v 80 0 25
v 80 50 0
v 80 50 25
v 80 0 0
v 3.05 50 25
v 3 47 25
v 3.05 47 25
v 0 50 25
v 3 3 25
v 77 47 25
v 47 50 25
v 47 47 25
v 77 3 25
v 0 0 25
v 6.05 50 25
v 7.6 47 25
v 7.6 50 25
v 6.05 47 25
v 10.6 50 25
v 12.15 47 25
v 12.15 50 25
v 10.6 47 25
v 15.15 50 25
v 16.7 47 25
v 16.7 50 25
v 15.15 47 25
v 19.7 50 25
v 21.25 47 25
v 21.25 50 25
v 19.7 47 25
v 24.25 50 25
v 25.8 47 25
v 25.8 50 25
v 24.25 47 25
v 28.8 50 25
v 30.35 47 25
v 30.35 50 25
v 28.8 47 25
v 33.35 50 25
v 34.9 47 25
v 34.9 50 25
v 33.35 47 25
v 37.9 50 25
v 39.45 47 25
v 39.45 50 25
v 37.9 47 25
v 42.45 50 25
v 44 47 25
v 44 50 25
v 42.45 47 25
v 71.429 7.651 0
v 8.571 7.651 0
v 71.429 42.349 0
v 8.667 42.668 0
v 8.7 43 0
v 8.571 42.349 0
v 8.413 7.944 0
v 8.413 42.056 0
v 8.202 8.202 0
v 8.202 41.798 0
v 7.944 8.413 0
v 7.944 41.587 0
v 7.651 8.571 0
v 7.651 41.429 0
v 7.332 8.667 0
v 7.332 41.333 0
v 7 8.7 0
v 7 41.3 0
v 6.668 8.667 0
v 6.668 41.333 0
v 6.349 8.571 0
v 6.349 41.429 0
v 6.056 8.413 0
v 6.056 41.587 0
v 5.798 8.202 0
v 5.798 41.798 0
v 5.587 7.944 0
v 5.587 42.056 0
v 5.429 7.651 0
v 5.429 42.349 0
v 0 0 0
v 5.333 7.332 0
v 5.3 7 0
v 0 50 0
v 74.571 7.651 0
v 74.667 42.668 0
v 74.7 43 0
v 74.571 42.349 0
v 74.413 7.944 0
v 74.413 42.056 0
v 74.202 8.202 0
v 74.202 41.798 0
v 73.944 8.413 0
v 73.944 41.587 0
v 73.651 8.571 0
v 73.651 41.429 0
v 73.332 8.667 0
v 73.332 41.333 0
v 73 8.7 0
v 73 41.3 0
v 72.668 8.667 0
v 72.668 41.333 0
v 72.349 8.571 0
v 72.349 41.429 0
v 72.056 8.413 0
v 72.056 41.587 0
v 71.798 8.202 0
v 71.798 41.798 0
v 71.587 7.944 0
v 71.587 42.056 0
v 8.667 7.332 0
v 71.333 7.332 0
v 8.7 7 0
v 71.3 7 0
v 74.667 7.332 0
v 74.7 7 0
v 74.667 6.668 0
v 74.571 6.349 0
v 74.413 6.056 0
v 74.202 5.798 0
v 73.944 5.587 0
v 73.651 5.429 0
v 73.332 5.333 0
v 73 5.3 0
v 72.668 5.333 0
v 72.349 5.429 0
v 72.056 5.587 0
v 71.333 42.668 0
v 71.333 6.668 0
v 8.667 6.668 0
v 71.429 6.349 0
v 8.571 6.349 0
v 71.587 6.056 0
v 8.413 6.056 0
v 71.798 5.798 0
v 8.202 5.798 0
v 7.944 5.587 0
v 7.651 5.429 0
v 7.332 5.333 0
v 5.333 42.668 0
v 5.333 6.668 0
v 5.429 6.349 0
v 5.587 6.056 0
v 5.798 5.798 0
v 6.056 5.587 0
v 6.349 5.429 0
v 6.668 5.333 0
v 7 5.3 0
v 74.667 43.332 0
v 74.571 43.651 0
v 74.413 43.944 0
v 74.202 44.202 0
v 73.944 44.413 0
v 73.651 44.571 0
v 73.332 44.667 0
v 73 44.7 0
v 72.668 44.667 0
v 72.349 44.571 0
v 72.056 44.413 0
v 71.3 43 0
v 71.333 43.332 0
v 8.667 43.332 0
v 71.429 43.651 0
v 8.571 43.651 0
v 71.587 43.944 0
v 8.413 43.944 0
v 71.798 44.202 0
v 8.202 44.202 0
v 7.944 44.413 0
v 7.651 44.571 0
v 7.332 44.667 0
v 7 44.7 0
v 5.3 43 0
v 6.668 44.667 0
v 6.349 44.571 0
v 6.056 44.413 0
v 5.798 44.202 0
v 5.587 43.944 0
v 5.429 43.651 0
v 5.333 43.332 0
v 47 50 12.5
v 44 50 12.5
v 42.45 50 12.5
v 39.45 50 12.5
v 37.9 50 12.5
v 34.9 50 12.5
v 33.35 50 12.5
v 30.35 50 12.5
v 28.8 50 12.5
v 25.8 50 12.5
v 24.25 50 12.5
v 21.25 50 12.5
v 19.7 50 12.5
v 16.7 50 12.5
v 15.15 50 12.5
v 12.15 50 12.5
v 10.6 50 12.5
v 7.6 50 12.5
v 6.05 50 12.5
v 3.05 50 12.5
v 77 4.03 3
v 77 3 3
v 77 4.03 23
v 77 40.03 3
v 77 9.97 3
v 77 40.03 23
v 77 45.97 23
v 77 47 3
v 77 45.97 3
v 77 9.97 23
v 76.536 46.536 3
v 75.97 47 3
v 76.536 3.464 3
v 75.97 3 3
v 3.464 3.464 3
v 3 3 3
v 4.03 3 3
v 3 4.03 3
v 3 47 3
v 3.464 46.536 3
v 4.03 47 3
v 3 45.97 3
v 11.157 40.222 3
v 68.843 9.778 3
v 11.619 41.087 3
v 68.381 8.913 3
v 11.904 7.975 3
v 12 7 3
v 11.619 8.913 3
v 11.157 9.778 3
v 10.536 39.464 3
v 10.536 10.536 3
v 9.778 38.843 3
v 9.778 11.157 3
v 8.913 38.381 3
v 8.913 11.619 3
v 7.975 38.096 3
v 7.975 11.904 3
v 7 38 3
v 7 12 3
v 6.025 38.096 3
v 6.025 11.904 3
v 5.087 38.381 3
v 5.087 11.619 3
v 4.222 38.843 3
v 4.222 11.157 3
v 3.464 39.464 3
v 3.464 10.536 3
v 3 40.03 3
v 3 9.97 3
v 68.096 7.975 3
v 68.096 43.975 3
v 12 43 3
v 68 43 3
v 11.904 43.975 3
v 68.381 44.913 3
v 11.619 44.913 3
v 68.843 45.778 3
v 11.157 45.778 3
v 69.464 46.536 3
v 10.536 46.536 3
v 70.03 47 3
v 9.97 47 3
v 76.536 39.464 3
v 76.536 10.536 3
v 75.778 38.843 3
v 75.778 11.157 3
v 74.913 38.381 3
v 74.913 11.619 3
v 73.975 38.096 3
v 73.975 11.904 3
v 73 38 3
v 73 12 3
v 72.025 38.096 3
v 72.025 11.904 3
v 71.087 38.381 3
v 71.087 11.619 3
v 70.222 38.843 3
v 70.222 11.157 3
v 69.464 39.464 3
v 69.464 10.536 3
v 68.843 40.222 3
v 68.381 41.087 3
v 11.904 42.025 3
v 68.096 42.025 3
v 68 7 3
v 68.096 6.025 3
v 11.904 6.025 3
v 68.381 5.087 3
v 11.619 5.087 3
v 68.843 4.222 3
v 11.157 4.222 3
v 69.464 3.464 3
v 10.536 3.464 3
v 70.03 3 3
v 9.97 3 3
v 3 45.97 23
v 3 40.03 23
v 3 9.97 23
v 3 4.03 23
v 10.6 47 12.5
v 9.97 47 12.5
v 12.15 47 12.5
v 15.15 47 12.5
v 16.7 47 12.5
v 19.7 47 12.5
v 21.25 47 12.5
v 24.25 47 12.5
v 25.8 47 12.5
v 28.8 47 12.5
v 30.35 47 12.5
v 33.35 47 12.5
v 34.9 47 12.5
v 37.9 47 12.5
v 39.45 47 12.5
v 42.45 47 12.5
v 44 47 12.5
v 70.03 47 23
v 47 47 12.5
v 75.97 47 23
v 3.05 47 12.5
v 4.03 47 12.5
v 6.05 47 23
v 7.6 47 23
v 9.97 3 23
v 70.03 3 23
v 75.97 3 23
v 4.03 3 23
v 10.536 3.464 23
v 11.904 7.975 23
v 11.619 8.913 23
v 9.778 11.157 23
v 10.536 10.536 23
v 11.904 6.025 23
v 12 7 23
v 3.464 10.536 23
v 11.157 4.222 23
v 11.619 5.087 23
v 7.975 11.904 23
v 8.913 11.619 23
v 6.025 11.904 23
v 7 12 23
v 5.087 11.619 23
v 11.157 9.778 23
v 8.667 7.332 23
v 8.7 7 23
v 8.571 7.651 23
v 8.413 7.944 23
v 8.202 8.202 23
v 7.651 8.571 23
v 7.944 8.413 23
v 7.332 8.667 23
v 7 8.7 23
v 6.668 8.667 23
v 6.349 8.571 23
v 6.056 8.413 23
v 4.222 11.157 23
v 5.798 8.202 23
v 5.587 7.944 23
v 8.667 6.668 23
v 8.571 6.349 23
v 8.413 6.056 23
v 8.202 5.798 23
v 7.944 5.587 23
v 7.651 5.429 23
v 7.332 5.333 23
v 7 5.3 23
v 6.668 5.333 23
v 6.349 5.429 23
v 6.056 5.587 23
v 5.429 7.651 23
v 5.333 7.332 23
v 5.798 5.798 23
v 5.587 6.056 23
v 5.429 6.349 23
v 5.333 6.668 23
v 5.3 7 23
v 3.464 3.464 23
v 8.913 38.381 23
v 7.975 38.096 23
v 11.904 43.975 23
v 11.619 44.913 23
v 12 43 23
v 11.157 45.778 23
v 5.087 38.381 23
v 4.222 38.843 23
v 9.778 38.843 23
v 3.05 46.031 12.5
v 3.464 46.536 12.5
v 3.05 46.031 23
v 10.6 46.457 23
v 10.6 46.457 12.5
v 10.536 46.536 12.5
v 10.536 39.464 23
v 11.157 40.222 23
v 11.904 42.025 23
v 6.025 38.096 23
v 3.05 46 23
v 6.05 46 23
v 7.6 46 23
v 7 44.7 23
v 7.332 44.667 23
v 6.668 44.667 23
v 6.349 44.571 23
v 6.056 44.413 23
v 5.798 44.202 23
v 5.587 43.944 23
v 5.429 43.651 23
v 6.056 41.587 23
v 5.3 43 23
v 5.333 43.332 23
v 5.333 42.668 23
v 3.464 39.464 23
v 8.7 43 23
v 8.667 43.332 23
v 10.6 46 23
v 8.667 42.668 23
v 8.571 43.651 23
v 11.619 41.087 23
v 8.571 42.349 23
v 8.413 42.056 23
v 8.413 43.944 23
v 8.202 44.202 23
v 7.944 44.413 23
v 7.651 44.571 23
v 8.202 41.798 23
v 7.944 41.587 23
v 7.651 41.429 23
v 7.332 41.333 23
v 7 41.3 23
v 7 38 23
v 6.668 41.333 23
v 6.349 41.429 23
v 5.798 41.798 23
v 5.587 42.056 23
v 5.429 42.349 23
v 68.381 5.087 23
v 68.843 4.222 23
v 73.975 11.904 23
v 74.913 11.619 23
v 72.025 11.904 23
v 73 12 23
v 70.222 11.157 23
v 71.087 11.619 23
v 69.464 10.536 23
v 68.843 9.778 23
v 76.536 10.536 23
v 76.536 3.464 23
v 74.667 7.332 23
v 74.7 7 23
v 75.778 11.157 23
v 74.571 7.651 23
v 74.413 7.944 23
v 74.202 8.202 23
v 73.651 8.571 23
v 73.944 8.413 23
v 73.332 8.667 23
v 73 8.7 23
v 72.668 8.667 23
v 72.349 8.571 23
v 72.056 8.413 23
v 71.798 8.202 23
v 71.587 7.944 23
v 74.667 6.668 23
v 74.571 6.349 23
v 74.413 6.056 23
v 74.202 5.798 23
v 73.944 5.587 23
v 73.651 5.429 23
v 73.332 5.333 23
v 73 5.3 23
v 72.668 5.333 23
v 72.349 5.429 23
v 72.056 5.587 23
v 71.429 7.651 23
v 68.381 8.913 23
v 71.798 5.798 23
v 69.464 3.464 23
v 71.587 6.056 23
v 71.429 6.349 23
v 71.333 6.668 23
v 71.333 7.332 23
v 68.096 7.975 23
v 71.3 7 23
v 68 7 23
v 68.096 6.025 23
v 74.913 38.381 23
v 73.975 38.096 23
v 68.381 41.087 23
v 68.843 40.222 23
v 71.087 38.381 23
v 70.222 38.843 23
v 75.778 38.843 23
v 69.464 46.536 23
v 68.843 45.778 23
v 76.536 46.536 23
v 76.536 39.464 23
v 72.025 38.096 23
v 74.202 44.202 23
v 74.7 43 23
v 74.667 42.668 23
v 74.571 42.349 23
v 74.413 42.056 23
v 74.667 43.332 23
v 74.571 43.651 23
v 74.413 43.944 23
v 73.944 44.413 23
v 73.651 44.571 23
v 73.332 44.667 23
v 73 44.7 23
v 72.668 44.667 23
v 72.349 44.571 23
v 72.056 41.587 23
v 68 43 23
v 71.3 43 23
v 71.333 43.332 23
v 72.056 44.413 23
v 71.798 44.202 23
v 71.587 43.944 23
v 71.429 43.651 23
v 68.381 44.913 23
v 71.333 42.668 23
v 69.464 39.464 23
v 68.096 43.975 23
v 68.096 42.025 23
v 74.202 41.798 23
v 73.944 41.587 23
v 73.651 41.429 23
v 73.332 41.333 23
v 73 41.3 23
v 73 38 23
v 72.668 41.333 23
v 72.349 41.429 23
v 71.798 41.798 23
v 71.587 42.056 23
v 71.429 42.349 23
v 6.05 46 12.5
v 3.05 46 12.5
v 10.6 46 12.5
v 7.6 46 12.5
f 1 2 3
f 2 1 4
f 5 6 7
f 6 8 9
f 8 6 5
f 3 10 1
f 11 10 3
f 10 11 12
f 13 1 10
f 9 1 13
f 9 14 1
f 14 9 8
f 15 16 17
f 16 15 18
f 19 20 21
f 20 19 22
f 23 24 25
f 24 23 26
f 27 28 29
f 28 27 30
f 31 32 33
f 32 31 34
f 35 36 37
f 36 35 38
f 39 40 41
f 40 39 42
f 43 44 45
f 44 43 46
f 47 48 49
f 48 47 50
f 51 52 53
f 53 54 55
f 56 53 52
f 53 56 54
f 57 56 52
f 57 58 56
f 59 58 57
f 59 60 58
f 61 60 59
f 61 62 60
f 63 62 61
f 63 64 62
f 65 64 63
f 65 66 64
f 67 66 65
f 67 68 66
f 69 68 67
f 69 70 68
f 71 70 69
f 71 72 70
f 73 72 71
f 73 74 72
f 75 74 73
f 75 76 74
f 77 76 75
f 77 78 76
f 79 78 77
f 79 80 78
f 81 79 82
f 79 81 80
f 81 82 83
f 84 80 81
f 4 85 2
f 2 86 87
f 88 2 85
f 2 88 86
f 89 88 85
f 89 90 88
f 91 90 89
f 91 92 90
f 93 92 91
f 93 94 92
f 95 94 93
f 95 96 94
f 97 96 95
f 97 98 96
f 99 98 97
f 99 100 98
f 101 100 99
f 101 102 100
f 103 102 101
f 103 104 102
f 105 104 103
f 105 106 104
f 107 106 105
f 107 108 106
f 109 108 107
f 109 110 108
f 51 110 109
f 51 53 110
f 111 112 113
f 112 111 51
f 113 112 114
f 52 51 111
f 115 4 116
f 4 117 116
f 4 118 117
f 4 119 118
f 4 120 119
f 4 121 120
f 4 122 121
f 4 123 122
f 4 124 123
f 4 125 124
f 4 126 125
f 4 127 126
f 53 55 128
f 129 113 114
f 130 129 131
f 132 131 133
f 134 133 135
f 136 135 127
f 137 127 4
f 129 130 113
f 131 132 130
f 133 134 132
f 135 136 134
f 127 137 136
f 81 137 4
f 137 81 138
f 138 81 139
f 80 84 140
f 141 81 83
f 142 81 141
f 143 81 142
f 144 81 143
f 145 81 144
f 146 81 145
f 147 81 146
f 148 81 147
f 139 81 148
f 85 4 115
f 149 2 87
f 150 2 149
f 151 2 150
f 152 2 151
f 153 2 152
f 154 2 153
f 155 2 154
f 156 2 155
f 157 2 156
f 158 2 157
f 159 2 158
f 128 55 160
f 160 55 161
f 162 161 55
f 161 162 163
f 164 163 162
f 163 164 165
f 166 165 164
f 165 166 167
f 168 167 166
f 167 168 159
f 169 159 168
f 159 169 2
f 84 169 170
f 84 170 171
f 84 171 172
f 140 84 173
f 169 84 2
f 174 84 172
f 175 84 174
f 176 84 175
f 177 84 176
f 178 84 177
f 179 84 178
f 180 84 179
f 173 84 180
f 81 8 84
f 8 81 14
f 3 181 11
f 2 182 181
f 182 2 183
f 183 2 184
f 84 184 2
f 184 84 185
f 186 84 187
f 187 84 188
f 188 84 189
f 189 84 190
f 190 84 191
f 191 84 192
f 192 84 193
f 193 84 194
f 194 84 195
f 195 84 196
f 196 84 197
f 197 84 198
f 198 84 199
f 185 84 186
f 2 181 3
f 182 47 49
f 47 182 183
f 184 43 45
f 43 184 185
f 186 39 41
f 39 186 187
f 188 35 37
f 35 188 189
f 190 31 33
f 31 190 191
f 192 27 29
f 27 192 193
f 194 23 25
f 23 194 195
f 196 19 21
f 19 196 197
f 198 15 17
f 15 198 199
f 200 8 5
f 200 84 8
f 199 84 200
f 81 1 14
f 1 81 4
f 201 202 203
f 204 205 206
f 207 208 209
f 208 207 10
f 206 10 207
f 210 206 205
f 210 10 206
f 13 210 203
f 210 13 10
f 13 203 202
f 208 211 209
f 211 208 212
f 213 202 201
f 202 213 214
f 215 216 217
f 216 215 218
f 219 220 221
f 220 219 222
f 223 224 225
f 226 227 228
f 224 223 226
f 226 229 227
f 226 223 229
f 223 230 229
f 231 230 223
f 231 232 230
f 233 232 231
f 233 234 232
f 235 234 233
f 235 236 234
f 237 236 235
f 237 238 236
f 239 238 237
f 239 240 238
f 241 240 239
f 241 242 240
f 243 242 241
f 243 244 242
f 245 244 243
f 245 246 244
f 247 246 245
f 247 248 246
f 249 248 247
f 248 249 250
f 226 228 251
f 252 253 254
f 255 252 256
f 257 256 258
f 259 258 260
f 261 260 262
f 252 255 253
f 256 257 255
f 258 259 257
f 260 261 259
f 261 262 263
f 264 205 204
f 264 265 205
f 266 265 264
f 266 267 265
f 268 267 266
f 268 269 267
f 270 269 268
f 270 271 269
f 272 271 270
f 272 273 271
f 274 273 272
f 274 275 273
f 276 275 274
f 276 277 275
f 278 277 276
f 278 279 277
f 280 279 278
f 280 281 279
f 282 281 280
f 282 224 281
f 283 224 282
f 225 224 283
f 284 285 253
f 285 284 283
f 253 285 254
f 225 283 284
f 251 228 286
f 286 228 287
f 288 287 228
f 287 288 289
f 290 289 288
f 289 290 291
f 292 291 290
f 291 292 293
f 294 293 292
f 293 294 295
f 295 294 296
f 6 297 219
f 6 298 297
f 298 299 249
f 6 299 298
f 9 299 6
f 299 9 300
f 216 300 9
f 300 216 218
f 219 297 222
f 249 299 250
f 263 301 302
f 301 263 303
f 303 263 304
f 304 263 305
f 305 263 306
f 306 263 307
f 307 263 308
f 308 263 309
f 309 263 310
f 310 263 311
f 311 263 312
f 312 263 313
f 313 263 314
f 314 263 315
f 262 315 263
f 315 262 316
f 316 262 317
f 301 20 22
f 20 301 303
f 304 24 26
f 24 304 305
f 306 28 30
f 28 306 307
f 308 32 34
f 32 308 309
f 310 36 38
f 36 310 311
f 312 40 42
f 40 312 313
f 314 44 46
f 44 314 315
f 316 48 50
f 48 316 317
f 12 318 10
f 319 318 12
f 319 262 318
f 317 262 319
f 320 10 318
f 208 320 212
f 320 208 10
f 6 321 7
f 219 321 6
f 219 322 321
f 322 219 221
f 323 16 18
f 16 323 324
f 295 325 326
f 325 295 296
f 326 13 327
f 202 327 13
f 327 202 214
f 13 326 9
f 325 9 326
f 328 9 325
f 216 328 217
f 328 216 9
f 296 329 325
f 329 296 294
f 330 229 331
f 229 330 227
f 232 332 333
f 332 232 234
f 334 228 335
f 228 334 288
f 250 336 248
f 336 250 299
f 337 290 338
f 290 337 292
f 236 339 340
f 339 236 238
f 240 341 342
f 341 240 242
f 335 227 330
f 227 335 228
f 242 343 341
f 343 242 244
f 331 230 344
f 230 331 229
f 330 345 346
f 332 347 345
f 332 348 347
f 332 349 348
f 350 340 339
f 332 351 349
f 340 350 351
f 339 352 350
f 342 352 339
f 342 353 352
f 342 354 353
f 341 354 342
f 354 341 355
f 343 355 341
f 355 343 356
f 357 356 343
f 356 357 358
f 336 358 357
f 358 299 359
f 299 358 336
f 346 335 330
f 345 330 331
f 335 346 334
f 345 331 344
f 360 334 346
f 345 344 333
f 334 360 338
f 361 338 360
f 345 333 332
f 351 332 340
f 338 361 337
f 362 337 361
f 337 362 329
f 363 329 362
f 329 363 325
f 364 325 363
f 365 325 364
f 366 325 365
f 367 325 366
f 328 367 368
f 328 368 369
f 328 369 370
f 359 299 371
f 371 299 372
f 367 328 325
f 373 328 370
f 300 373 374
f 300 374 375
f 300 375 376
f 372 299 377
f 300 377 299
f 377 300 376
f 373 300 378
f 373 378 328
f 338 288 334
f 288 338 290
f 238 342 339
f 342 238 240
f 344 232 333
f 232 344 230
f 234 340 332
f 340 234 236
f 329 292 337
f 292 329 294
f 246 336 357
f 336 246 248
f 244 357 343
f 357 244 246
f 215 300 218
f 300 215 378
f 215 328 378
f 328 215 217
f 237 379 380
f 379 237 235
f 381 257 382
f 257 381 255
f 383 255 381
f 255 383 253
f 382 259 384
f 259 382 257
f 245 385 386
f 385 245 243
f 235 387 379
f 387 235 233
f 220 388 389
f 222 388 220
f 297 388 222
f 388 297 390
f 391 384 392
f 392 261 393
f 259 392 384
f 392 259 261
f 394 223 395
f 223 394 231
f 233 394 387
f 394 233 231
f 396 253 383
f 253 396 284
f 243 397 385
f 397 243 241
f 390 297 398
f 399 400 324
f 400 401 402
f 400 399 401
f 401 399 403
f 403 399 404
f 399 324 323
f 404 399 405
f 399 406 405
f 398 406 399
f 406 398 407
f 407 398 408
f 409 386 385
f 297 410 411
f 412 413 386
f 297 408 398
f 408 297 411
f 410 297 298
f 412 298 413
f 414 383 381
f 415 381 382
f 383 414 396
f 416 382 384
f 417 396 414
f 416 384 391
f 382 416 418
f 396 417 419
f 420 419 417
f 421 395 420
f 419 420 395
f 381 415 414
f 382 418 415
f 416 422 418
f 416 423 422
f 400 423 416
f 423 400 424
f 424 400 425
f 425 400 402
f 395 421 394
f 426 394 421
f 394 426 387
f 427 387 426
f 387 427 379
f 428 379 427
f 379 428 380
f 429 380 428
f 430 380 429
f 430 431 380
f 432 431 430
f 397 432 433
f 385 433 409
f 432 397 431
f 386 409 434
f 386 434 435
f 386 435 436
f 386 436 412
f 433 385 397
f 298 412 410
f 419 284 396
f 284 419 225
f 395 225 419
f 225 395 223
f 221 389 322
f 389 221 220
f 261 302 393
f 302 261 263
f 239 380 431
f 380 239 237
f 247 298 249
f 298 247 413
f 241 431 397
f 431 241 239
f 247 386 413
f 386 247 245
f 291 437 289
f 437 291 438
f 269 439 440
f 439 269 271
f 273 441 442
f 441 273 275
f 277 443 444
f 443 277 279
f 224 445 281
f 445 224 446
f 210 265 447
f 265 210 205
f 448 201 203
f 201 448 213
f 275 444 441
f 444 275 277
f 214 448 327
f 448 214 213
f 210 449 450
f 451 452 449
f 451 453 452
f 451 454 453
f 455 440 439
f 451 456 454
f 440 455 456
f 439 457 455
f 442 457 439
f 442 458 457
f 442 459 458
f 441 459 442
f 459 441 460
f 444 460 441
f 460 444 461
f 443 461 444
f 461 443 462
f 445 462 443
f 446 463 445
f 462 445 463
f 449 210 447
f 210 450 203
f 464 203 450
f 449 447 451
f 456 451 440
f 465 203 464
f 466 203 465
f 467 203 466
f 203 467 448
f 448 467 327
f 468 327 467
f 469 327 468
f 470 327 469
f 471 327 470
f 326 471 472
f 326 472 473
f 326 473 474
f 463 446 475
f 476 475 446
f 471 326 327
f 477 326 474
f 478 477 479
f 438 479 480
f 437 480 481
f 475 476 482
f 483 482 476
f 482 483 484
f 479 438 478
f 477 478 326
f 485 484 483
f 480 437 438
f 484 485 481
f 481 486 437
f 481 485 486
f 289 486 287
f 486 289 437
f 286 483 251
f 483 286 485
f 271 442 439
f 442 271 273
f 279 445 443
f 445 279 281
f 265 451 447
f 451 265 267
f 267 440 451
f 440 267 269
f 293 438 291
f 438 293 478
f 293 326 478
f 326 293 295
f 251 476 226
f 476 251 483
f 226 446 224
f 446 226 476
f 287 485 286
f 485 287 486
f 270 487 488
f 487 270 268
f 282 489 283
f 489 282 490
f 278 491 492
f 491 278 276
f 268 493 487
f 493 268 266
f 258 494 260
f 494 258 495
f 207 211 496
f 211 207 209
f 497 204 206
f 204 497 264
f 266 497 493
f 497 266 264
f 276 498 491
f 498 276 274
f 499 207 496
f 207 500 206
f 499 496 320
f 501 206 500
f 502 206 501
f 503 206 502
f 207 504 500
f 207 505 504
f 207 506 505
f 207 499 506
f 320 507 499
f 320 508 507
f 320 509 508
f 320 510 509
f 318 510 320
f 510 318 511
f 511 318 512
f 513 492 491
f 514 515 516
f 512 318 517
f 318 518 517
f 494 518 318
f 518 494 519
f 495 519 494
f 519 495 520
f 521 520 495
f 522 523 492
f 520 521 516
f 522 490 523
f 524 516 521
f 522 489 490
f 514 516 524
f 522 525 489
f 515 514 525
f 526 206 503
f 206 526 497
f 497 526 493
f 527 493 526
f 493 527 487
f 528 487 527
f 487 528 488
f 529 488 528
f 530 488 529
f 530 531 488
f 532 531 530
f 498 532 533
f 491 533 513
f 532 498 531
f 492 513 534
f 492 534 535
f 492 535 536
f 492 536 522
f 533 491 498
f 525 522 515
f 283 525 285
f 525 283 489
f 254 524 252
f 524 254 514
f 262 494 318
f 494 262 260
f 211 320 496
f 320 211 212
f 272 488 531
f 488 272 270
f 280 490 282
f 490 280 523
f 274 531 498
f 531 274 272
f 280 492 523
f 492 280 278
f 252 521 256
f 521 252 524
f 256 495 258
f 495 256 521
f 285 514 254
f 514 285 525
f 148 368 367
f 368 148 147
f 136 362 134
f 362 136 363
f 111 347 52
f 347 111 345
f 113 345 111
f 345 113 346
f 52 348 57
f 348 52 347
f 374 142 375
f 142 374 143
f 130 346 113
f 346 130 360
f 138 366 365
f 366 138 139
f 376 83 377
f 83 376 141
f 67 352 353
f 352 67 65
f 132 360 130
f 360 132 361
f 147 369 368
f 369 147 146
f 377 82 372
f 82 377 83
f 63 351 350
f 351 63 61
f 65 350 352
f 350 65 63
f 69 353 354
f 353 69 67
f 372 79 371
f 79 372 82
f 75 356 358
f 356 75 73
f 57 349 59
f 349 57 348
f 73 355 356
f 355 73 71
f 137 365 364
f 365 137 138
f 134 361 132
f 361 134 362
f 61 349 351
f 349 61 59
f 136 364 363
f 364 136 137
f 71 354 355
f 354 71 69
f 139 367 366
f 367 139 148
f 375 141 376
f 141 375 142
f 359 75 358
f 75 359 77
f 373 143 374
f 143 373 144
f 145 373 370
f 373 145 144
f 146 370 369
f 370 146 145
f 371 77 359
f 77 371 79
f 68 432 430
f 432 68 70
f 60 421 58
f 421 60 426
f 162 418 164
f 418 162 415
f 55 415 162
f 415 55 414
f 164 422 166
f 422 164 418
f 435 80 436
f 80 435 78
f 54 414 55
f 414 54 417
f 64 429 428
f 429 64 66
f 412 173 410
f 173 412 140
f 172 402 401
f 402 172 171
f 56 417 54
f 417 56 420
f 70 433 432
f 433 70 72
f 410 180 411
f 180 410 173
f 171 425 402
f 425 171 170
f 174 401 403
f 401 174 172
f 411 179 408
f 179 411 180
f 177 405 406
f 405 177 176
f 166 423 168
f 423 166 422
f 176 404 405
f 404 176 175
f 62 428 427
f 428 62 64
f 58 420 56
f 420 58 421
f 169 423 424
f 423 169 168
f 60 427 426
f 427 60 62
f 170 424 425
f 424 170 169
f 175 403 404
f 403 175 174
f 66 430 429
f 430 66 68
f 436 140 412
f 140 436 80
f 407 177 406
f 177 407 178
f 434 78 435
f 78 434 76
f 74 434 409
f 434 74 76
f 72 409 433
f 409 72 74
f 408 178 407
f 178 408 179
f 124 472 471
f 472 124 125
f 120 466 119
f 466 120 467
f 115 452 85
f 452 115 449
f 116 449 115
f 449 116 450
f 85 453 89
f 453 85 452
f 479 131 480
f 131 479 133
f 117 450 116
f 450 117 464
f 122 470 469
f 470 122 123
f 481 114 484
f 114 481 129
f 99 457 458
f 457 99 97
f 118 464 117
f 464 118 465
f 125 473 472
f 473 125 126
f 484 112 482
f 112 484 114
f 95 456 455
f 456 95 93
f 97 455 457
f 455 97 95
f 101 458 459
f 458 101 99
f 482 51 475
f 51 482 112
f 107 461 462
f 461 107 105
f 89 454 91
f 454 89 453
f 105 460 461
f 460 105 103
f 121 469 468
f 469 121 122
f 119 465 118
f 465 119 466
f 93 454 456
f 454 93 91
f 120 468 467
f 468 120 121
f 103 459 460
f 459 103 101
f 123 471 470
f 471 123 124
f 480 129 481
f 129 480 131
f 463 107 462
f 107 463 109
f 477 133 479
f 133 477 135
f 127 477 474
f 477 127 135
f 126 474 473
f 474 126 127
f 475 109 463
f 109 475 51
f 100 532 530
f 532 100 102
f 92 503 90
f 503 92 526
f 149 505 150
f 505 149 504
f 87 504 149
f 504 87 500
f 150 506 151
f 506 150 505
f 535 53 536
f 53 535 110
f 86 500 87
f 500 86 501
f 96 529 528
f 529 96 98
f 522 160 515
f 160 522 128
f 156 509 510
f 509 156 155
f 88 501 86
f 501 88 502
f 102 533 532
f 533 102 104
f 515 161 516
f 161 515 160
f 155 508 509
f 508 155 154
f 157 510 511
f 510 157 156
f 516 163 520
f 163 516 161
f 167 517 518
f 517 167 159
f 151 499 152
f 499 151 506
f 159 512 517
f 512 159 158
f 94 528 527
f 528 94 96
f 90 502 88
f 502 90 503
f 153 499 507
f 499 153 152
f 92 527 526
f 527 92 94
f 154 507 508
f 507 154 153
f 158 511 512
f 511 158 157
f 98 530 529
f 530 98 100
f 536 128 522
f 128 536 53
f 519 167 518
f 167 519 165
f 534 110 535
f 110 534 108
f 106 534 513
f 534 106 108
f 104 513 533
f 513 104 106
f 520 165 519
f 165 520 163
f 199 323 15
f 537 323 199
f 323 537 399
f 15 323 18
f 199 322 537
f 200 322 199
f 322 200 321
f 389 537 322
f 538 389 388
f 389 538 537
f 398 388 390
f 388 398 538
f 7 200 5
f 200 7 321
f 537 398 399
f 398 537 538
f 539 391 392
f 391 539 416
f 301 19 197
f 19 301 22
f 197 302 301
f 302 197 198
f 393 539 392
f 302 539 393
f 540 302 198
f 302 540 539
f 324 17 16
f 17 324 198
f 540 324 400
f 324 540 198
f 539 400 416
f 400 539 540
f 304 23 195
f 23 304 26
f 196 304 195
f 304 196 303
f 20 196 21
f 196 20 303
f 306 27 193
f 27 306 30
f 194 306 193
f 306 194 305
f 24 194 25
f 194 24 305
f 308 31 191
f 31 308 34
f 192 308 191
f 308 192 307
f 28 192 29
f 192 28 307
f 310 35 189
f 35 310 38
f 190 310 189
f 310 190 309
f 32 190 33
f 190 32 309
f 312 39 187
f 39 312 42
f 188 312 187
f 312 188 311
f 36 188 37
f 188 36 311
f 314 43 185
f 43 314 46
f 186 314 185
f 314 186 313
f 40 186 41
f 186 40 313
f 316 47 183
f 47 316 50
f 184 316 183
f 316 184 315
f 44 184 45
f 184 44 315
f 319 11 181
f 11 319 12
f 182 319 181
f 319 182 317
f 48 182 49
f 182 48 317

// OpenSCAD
$fn = 32;

// ----------------------------------------------------------------------
// Enclosure body: 80 x 50 x 25 mm, wall 3 mm
// ----------------------------------------------------------------------

// --- parameters (mm) ---
length = 80;              // outside length, X
width = 50;               // outside width, Y
height = 25;              // outside height, Z
wall = 3;                 // side wall thickness
floor_t = 3;              // floor thickness
boss_d = 10;              // corner boss diameter
boss_h = 20;              // corner boss height above the floor
boss_hole_d = 3.4;        // lid screw clearance in the boss
boss_lip = 7;             // boss centre inset from the corner
vent_slots = 10;          // vent slots in the long wall
vent_w = 3;               // vent slot width
vent_h = 20;              // vent slot height
vent_pitch = 4.55;        // vent slot pitch
vent_z = 12.5;            // vent slot sill height

module shell() {
  difference() {
    cube([length, width, height]);
    /* hollow, open at the top */
    translate([wall, wall, floor_t])
      cube([length - 2 * wall, width - 2 * wall, height]);
  }
}

module bosses() {
  /* corner bosses, sunk 1 mm into the floor */
  for (sx = [0, 1]) for (sy = [0, 1])
    translate([sx * (length - 2 * boss_lip) + boss_lip, sy * (width - 2 * boss_lip) + boss_lip, floor_t - 1])
      cylinder(h = boss_h + 1, d = boss_d);
}

difference() {
  union() {
    shell();
    bosses();
  }
  /* boss screw holes */
  for (sx = [0, 1]) for (sy = [0, 1])
    translate([sx * (length - 2 * boss_lip) + boss_lip, sy * (width - 2 * boss_lip) + boss_lip, -1]) cylinder(h = floor_t + boss_h + 2, d = boss_hole_d);
  /* vent grille in the +Y wall */
  for (i = [0 : vent_slots - 1]) translate([vent_pitch * (i + 1) - vent_w / 2, width - wall - 1, vent_z]) cube([vent_w, wall + 2, vent_h]);
}
